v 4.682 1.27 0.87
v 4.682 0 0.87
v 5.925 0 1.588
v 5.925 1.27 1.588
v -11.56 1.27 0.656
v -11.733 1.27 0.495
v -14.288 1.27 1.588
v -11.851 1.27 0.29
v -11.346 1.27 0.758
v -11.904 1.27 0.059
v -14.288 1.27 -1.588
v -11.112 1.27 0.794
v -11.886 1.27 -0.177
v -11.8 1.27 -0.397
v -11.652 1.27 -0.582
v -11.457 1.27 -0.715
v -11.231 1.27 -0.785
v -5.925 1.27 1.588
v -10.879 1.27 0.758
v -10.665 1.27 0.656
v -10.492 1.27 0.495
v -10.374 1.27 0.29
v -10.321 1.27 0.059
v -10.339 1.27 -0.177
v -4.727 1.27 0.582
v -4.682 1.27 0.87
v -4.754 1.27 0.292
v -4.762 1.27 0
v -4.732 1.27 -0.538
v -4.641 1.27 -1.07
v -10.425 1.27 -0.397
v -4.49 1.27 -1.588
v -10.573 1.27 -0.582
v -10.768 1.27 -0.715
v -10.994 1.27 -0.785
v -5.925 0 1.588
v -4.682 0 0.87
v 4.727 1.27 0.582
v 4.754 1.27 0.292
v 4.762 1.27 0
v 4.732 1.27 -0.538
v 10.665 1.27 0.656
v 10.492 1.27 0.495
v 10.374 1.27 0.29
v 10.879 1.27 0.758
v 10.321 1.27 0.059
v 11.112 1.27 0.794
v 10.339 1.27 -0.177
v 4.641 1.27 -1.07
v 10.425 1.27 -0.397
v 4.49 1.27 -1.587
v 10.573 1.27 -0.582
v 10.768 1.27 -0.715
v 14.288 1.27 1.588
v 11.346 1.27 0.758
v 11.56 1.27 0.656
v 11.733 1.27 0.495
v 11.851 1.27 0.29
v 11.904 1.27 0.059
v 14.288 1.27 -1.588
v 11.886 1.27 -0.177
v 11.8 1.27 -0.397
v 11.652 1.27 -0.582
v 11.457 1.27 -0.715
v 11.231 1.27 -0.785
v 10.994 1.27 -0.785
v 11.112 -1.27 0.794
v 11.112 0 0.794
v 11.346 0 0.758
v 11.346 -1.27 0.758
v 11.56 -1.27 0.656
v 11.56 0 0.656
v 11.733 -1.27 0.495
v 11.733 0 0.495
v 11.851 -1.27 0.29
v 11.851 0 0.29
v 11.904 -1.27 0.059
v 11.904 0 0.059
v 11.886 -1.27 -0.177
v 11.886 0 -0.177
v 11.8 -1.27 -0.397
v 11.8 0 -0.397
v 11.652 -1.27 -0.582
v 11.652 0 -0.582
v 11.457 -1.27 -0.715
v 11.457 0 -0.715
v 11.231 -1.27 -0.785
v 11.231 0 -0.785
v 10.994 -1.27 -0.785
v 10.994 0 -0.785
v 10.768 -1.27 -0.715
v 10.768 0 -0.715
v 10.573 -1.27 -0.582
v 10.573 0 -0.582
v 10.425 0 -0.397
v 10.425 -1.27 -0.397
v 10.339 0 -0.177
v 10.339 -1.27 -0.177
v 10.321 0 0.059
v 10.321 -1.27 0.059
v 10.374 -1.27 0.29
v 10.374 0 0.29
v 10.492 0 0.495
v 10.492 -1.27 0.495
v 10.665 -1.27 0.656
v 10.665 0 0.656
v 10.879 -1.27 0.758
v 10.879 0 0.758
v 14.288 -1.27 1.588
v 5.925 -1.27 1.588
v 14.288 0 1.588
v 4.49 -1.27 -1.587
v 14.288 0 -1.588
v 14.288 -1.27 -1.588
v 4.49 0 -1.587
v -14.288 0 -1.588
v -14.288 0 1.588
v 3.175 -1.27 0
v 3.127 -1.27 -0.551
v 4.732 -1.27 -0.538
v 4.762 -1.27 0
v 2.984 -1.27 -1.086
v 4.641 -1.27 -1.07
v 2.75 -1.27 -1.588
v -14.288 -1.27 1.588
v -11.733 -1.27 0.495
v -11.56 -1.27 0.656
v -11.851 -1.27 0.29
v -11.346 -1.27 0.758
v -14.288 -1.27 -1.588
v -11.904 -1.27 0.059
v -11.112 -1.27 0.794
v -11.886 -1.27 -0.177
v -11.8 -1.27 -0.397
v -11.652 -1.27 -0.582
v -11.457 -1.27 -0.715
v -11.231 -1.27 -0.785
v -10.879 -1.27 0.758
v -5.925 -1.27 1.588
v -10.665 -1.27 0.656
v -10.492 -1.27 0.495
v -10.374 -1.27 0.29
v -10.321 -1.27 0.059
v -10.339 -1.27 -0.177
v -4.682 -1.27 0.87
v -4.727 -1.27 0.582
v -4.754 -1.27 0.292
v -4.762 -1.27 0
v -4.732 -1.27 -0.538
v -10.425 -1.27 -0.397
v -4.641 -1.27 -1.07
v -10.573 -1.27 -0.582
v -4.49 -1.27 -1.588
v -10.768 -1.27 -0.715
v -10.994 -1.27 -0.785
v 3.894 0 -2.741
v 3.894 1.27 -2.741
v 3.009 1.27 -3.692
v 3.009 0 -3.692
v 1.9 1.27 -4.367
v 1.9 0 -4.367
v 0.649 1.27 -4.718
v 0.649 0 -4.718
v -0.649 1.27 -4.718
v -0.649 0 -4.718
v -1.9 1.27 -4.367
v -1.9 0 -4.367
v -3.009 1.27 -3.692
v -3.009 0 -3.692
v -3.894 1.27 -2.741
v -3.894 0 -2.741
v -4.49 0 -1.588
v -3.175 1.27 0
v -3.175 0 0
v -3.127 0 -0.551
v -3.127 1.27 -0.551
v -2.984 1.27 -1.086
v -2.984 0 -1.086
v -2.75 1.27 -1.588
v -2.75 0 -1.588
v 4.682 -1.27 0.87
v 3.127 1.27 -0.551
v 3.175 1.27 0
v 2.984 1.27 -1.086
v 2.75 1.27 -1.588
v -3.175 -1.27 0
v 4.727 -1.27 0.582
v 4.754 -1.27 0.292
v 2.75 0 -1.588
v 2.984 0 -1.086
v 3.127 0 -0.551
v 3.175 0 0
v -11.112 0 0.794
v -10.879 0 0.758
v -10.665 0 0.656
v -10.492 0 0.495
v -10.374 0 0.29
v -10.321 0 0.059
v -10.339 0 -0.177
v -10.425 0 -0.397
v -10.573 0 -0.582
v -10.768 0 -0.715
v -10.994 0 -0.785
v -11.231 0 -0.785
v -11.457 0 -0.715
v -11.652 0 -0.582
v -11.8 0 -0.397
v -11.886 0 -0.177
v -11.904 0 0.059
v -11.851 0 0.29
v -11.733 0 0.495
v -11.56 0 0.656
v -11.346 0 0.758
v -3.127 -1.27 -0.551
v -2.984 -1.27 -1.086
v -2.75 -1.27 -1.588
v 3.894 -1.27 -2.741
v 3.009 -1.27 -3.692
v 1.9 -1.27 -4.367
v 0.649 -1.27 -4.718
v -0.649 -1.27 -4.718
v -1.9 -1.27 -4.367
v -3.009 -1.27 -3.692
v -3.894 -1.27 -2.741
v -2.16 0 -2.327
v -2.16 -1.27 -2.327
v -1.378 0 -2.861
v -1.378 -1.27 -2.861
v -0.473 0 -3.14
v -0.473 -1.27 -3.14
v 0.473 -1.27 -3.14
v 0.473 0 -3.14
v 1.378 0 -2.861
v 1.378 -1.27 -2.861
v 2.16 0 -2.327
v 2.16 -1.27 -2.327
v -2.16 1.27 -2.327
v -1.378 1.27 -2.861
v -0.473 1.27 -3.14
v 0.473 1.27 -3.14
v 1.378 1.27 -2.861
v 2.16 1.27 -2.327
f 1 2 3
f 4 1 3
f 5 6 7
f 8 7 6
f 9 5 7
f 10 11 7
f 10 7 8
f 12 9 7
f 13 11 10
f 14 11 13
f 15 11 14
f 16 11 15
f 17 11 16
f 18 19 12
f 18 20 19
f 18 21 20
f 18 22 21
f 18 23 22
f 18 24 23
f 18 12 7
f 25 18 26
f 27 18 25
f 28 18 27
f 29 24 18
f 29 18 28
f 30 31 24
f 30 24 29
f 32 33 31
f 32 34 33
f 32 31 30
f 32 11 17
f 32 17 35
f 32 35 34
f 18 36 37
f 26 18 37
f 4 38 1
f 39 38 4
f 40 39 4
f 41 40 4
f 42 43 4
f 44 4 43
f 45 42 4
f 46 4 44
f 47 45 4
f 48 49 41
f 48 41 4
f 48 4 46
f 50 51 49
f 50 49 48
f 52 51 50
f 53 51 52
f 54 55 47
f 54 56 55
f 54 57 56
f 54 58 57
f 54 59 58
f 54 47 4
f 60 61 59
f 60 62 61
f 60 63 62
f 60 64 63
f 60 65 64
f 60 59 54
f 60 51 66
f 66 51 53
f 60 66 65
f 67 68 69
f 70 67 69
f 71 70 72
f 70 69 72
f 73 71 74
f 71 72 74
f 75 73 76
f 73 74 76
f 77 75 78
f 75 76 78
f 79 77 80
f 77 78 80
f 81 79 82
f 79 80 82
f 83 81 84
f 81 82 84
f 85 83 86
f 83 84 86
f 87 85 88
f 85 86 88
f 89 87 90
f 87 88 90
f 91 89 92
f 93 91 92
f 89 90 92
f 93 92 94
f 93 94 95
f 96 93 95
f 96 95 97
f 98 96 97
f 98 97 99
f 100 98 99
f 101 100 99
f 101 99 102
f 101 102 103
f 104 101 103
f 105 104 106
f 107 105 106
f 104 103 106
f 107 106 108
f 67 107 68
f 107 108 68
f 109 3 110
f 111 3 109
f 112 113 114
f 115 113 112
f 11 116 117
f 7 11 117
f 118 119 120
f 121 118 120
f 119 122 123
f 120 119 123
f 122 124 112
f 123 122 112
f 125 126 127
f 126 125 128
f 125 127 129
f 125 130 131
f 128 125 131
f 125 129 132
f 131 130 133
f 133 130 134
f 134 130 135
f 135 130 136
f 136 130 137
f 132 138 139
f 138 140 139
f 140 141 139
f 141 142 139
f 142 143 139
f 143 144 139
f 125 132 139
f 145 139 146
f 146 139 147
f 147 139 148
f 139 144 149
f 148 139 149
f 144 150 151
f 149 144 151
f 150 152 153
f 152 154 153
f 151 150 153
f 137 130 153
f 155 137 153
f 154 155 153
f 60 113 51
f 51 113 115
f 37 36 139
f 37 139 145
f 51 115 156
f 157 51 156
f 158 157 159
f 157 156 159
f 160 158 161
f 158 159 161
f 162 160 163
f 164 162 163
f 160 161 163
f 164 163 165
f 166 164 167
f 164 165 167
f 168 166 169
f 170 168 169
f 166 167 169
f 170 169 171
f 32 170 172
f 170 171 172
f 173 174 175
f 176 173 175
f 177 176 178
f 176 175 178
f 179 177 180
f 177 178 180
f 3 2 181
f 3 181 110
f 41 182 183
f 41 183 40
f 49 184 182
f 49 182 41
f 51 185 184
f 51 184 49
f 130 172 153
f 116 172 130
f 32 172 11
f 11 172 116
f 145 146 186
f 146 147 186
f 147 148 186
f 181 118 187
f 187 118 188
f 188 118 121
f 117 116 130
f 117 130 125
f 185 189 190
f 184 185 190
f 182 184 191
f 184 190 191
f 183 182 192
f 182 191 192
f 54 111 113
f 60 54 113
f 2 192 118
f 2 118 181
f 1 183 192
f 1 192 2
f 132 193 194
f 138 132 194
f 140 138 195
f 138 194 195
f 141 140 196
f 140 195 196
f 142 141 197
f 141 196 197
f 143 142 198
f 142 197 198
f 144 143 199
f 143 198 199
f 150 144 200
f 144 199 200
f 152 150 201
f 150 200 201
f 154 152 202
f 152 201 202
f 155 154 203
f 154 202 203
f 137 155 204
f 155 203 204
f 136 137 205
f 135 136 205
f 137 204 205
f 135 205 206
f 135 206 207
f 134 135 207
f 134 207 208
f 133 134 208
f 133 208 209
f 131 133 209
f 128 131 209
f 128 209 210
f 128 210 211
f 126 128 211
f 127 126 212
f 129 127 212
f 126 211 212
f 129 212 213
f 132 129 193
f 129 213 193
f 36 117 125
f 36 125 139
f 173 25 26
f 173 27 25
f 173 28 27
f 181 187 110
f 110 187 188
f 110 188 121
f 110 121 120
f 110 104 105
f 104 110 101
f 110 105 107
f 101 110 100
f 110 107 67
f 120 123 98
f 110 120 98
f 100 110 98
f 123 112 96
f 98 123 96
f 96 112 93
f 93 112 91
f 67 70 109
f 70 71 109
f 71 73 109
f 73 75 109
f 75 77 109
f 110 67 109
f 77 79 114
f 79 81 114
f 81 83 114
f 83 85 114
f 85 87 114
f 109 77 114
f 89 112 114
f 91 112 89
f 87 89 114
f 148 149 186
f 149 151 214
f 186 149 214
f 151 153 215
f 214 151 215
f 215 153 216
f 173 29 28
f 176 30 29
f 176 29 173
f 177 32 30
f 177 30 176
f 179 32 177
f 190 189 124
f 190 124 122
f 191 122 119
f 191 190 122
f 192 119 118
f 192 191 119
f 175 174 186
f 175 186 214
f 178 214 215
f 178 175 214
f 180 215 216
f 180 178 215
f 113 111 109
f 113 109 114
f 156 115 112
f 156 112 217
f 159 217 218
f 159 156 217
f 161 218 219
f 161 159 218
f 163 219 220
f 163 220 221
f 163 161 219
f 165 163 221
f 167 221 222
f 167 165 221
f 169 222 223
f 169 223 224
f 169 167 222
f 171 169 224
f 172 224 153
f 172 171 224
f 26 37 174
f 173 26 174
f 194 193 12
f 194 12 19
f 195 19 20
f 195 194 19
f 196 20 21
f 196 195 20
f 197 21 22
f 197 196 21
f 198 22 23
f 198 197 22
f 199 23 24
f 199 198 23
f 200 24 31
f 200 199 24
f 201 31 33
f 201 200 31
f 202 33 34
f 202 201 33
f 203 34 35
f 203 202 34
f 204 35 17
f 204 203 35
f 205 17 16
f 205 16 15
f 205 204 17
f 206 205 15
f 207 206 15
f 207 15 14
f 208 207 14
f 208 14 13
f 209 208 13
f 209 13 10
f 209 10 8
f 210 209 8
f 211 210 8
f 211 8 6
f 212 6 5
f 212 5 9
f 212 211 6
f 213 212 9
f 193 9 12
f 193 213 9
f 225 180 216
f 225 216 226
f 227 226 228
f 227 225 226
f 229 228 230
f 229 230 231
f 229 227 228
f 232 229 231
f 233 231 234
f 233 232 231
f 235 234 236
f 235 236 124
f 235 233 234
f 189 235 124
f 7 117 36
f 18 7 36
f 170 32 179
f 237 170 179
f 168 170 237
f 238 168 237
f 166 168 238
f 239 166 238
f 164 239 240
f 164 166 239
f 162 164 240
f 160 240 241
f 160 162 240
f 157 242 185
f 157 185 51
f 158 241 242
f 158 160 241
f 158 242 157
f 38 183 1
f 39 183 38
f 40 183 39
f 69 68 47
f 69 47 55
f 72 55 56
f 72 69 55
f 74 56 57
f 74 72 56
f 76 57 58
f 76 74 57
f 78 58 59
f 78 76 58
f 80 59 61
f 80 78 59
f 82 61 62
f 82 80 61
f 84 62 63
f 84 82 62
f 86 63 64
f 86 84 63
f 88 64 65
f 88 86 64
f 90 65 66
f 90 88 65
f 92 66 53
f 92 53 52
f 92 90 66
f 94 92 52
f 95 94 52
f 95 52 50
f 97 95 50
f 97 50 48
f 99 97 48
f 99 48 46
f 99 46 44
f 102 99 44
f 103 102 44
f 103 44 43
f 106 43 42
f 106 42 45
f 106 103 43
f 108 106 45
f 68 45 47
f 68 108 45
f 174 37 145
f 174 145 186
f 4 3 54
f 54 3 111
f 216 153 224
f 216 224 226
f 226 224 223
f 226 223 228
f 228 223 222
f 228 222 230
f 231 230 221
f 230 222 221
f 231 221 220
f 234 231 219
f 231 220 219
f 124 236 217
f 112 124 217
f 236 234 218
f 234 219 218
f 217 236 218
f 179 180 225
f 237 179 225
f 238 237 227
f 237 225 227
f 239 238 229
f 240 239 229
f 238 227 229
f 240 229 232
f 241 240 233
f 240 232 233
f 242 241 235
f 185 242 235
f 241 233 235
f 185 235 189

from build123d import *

# Parameters (mm, degrees)
SKETCH1_R           = 0.79375
BOSS_EXTRUDE1_DEPTH = 1.27


with BuildPart() as part:
    # Sketch1 → Boss-Extrude1 (new, symmetric)
    # profile 1 of 7: a face of its own
    with BuildSketch(Plane(origin=(0, 0, 0), x_dir=(1, 0, 0), z_dir=(0, 1, 0))):
        with BuildLine():
            ThreePointArc((-4.682314967, -0.870248702), (-4.742411374, -0.436967517), (-4.7625, 0))
            ThreePointArc((-4.7625, 0), (-4.69391314, 0.805348174), (-4.490128061, 1.5875))
            Line((-4.490128061, 1.5875), (-14.2875, 1.5875))
            Line((-14.2875, 1.5875), (-14.2875, -1.5875))
            Line((-14.2875, -1.5875), (-5.924630657, -1.5875))
            Line((-5.924630657, -1.5875), (-4.682314967, -0.870248702))
        make_face()
        with Locations(Location((-11.1125, 0, 0), (0, 0, 270))):
            Circle(SKETCH1_R, mode=Mode.SUBTRACT)
    # profile 2 of 7: a face of its own
    with BuildSketch(Plane(origin=(0, 0, 0), x_dir=(1, 0, 0), z_dir=(0, 1, 0))):
        with BuildLine():
            Line((-4.7625, 0), (-3.175, 0))
            ThreePointArc((-3.175, 0), (-3.066814498, 0.821750468), (-2.749630657, 1.5875))
            Line((-2.749630657, 1.5875), (-4.490128061, 1.5875))
            ThreePointArc((-4.490128061, 1.5875), (-4.69391314, 0.805348174), (-4.7625, 0))
        make_face()
    # profile 3 of 7: a face of its own
    with BuildSketch(Plane(origin=(0, 0, 0), x_dir=(1, 0, 0), z_dir=(0, 1, 0))):
        with BuildLine():
            ThreePointArc((-2.749630657, 1.5875), (0, 3.175), (2.749630657, 1.5875))
            Line((2.749630657, 1.5875), (4.490128061, 1.5875))
            ThreePointArc((4.490128061, 1.5875), (0, 4.7625), (-4.490128061, 1.5875))
            Line((-4.490128061, 1.5875), (-2.749630657, 1.5875))
        make_face()
    # profile 4 of 7: a face of its own
    with BuildSketch(Plane(origin=(0, 0, 0), x_dir=(1, 0, 0), z_dir=(0, 1, 0))):
        with BuildLine():
            ThreePointArc((2.749630657, 1.5875), (3.066814498, 0.821750468), (3.175, 0))
            Line((3.175, 0), (4.7625, 0))
            ThreePointArc((4.7625, 0), (4.69391314, 0.805348174), (4.490128061, 1.5875))
            Line((4.490128061, 1.5875), (2.749630657, 1.5875))
        make_face()
    # profile 5 of 7: a face of its own
    with BuildSketch(Plane(origin=(0, 0, 0), x_dir=(1, 0, 0), z_dir=(0, 1, 0))):
        with BuildLine():
            ThreePointArc((4.490128061, 1.5875), (4.69391314, 0.805348174), (4.7625, 0))
            ThreePointArc((4.7625, 0), (4.742411374, -0.436967517), (4.682314967, -0.870248702))
            Line((4.682314967, -0.870248702), (5.924630657, -1.5875))
            Line((5.924630657, -1.5875), (14.2875, -1.5875))
            Line((14.2875, -1.5875), (14.2875, 1.5875))
            Line((14.2875, 1.5875), (4.490128061, 1.5875))
        make_face()
        with Locations(Location((11.1125, 0, 0), (0, 0, 270))):
            Circle(SKETCH1_R, mode=Mode.SUBTRACT)
    # profile 6 of 7: a face of its own
    with BuildSketch(Plane(origin=(0, 0, 0), x_dir=(1, 0, 0), z_dir=(0, 1, 0))):
        with BuildLine():
            Line((-4.682314967, -0.870248702), (-3.175, 0))
            Line((-3.175, 0), (-4.7625, 0))
            ThreePointArc((-4.7625, 0), (-4.742411374, -0.436967517), (-4.682314967, -0.870248702))
        make_face()
    # profile 7 of 7: a face of its own
    with BuildSketch(Plane(origin=(0, 0, 0), x_dir=(1, 0, 0), z_dir=(0, 1, 0))):
        with BuildLine():
            Line((4.7625, 0), (3.175, 0))
            Line((3.175, 0), (4.682314967, -0.870248702))
            ThreePointArc((4.682314967, -0.870248702), (4.742411374, -0.436967517), (4.7625, 0))
        make_face()
    extrude(amount=BOSS_EXTRUDE1_DEPTH, both=True)


solid = part.part
